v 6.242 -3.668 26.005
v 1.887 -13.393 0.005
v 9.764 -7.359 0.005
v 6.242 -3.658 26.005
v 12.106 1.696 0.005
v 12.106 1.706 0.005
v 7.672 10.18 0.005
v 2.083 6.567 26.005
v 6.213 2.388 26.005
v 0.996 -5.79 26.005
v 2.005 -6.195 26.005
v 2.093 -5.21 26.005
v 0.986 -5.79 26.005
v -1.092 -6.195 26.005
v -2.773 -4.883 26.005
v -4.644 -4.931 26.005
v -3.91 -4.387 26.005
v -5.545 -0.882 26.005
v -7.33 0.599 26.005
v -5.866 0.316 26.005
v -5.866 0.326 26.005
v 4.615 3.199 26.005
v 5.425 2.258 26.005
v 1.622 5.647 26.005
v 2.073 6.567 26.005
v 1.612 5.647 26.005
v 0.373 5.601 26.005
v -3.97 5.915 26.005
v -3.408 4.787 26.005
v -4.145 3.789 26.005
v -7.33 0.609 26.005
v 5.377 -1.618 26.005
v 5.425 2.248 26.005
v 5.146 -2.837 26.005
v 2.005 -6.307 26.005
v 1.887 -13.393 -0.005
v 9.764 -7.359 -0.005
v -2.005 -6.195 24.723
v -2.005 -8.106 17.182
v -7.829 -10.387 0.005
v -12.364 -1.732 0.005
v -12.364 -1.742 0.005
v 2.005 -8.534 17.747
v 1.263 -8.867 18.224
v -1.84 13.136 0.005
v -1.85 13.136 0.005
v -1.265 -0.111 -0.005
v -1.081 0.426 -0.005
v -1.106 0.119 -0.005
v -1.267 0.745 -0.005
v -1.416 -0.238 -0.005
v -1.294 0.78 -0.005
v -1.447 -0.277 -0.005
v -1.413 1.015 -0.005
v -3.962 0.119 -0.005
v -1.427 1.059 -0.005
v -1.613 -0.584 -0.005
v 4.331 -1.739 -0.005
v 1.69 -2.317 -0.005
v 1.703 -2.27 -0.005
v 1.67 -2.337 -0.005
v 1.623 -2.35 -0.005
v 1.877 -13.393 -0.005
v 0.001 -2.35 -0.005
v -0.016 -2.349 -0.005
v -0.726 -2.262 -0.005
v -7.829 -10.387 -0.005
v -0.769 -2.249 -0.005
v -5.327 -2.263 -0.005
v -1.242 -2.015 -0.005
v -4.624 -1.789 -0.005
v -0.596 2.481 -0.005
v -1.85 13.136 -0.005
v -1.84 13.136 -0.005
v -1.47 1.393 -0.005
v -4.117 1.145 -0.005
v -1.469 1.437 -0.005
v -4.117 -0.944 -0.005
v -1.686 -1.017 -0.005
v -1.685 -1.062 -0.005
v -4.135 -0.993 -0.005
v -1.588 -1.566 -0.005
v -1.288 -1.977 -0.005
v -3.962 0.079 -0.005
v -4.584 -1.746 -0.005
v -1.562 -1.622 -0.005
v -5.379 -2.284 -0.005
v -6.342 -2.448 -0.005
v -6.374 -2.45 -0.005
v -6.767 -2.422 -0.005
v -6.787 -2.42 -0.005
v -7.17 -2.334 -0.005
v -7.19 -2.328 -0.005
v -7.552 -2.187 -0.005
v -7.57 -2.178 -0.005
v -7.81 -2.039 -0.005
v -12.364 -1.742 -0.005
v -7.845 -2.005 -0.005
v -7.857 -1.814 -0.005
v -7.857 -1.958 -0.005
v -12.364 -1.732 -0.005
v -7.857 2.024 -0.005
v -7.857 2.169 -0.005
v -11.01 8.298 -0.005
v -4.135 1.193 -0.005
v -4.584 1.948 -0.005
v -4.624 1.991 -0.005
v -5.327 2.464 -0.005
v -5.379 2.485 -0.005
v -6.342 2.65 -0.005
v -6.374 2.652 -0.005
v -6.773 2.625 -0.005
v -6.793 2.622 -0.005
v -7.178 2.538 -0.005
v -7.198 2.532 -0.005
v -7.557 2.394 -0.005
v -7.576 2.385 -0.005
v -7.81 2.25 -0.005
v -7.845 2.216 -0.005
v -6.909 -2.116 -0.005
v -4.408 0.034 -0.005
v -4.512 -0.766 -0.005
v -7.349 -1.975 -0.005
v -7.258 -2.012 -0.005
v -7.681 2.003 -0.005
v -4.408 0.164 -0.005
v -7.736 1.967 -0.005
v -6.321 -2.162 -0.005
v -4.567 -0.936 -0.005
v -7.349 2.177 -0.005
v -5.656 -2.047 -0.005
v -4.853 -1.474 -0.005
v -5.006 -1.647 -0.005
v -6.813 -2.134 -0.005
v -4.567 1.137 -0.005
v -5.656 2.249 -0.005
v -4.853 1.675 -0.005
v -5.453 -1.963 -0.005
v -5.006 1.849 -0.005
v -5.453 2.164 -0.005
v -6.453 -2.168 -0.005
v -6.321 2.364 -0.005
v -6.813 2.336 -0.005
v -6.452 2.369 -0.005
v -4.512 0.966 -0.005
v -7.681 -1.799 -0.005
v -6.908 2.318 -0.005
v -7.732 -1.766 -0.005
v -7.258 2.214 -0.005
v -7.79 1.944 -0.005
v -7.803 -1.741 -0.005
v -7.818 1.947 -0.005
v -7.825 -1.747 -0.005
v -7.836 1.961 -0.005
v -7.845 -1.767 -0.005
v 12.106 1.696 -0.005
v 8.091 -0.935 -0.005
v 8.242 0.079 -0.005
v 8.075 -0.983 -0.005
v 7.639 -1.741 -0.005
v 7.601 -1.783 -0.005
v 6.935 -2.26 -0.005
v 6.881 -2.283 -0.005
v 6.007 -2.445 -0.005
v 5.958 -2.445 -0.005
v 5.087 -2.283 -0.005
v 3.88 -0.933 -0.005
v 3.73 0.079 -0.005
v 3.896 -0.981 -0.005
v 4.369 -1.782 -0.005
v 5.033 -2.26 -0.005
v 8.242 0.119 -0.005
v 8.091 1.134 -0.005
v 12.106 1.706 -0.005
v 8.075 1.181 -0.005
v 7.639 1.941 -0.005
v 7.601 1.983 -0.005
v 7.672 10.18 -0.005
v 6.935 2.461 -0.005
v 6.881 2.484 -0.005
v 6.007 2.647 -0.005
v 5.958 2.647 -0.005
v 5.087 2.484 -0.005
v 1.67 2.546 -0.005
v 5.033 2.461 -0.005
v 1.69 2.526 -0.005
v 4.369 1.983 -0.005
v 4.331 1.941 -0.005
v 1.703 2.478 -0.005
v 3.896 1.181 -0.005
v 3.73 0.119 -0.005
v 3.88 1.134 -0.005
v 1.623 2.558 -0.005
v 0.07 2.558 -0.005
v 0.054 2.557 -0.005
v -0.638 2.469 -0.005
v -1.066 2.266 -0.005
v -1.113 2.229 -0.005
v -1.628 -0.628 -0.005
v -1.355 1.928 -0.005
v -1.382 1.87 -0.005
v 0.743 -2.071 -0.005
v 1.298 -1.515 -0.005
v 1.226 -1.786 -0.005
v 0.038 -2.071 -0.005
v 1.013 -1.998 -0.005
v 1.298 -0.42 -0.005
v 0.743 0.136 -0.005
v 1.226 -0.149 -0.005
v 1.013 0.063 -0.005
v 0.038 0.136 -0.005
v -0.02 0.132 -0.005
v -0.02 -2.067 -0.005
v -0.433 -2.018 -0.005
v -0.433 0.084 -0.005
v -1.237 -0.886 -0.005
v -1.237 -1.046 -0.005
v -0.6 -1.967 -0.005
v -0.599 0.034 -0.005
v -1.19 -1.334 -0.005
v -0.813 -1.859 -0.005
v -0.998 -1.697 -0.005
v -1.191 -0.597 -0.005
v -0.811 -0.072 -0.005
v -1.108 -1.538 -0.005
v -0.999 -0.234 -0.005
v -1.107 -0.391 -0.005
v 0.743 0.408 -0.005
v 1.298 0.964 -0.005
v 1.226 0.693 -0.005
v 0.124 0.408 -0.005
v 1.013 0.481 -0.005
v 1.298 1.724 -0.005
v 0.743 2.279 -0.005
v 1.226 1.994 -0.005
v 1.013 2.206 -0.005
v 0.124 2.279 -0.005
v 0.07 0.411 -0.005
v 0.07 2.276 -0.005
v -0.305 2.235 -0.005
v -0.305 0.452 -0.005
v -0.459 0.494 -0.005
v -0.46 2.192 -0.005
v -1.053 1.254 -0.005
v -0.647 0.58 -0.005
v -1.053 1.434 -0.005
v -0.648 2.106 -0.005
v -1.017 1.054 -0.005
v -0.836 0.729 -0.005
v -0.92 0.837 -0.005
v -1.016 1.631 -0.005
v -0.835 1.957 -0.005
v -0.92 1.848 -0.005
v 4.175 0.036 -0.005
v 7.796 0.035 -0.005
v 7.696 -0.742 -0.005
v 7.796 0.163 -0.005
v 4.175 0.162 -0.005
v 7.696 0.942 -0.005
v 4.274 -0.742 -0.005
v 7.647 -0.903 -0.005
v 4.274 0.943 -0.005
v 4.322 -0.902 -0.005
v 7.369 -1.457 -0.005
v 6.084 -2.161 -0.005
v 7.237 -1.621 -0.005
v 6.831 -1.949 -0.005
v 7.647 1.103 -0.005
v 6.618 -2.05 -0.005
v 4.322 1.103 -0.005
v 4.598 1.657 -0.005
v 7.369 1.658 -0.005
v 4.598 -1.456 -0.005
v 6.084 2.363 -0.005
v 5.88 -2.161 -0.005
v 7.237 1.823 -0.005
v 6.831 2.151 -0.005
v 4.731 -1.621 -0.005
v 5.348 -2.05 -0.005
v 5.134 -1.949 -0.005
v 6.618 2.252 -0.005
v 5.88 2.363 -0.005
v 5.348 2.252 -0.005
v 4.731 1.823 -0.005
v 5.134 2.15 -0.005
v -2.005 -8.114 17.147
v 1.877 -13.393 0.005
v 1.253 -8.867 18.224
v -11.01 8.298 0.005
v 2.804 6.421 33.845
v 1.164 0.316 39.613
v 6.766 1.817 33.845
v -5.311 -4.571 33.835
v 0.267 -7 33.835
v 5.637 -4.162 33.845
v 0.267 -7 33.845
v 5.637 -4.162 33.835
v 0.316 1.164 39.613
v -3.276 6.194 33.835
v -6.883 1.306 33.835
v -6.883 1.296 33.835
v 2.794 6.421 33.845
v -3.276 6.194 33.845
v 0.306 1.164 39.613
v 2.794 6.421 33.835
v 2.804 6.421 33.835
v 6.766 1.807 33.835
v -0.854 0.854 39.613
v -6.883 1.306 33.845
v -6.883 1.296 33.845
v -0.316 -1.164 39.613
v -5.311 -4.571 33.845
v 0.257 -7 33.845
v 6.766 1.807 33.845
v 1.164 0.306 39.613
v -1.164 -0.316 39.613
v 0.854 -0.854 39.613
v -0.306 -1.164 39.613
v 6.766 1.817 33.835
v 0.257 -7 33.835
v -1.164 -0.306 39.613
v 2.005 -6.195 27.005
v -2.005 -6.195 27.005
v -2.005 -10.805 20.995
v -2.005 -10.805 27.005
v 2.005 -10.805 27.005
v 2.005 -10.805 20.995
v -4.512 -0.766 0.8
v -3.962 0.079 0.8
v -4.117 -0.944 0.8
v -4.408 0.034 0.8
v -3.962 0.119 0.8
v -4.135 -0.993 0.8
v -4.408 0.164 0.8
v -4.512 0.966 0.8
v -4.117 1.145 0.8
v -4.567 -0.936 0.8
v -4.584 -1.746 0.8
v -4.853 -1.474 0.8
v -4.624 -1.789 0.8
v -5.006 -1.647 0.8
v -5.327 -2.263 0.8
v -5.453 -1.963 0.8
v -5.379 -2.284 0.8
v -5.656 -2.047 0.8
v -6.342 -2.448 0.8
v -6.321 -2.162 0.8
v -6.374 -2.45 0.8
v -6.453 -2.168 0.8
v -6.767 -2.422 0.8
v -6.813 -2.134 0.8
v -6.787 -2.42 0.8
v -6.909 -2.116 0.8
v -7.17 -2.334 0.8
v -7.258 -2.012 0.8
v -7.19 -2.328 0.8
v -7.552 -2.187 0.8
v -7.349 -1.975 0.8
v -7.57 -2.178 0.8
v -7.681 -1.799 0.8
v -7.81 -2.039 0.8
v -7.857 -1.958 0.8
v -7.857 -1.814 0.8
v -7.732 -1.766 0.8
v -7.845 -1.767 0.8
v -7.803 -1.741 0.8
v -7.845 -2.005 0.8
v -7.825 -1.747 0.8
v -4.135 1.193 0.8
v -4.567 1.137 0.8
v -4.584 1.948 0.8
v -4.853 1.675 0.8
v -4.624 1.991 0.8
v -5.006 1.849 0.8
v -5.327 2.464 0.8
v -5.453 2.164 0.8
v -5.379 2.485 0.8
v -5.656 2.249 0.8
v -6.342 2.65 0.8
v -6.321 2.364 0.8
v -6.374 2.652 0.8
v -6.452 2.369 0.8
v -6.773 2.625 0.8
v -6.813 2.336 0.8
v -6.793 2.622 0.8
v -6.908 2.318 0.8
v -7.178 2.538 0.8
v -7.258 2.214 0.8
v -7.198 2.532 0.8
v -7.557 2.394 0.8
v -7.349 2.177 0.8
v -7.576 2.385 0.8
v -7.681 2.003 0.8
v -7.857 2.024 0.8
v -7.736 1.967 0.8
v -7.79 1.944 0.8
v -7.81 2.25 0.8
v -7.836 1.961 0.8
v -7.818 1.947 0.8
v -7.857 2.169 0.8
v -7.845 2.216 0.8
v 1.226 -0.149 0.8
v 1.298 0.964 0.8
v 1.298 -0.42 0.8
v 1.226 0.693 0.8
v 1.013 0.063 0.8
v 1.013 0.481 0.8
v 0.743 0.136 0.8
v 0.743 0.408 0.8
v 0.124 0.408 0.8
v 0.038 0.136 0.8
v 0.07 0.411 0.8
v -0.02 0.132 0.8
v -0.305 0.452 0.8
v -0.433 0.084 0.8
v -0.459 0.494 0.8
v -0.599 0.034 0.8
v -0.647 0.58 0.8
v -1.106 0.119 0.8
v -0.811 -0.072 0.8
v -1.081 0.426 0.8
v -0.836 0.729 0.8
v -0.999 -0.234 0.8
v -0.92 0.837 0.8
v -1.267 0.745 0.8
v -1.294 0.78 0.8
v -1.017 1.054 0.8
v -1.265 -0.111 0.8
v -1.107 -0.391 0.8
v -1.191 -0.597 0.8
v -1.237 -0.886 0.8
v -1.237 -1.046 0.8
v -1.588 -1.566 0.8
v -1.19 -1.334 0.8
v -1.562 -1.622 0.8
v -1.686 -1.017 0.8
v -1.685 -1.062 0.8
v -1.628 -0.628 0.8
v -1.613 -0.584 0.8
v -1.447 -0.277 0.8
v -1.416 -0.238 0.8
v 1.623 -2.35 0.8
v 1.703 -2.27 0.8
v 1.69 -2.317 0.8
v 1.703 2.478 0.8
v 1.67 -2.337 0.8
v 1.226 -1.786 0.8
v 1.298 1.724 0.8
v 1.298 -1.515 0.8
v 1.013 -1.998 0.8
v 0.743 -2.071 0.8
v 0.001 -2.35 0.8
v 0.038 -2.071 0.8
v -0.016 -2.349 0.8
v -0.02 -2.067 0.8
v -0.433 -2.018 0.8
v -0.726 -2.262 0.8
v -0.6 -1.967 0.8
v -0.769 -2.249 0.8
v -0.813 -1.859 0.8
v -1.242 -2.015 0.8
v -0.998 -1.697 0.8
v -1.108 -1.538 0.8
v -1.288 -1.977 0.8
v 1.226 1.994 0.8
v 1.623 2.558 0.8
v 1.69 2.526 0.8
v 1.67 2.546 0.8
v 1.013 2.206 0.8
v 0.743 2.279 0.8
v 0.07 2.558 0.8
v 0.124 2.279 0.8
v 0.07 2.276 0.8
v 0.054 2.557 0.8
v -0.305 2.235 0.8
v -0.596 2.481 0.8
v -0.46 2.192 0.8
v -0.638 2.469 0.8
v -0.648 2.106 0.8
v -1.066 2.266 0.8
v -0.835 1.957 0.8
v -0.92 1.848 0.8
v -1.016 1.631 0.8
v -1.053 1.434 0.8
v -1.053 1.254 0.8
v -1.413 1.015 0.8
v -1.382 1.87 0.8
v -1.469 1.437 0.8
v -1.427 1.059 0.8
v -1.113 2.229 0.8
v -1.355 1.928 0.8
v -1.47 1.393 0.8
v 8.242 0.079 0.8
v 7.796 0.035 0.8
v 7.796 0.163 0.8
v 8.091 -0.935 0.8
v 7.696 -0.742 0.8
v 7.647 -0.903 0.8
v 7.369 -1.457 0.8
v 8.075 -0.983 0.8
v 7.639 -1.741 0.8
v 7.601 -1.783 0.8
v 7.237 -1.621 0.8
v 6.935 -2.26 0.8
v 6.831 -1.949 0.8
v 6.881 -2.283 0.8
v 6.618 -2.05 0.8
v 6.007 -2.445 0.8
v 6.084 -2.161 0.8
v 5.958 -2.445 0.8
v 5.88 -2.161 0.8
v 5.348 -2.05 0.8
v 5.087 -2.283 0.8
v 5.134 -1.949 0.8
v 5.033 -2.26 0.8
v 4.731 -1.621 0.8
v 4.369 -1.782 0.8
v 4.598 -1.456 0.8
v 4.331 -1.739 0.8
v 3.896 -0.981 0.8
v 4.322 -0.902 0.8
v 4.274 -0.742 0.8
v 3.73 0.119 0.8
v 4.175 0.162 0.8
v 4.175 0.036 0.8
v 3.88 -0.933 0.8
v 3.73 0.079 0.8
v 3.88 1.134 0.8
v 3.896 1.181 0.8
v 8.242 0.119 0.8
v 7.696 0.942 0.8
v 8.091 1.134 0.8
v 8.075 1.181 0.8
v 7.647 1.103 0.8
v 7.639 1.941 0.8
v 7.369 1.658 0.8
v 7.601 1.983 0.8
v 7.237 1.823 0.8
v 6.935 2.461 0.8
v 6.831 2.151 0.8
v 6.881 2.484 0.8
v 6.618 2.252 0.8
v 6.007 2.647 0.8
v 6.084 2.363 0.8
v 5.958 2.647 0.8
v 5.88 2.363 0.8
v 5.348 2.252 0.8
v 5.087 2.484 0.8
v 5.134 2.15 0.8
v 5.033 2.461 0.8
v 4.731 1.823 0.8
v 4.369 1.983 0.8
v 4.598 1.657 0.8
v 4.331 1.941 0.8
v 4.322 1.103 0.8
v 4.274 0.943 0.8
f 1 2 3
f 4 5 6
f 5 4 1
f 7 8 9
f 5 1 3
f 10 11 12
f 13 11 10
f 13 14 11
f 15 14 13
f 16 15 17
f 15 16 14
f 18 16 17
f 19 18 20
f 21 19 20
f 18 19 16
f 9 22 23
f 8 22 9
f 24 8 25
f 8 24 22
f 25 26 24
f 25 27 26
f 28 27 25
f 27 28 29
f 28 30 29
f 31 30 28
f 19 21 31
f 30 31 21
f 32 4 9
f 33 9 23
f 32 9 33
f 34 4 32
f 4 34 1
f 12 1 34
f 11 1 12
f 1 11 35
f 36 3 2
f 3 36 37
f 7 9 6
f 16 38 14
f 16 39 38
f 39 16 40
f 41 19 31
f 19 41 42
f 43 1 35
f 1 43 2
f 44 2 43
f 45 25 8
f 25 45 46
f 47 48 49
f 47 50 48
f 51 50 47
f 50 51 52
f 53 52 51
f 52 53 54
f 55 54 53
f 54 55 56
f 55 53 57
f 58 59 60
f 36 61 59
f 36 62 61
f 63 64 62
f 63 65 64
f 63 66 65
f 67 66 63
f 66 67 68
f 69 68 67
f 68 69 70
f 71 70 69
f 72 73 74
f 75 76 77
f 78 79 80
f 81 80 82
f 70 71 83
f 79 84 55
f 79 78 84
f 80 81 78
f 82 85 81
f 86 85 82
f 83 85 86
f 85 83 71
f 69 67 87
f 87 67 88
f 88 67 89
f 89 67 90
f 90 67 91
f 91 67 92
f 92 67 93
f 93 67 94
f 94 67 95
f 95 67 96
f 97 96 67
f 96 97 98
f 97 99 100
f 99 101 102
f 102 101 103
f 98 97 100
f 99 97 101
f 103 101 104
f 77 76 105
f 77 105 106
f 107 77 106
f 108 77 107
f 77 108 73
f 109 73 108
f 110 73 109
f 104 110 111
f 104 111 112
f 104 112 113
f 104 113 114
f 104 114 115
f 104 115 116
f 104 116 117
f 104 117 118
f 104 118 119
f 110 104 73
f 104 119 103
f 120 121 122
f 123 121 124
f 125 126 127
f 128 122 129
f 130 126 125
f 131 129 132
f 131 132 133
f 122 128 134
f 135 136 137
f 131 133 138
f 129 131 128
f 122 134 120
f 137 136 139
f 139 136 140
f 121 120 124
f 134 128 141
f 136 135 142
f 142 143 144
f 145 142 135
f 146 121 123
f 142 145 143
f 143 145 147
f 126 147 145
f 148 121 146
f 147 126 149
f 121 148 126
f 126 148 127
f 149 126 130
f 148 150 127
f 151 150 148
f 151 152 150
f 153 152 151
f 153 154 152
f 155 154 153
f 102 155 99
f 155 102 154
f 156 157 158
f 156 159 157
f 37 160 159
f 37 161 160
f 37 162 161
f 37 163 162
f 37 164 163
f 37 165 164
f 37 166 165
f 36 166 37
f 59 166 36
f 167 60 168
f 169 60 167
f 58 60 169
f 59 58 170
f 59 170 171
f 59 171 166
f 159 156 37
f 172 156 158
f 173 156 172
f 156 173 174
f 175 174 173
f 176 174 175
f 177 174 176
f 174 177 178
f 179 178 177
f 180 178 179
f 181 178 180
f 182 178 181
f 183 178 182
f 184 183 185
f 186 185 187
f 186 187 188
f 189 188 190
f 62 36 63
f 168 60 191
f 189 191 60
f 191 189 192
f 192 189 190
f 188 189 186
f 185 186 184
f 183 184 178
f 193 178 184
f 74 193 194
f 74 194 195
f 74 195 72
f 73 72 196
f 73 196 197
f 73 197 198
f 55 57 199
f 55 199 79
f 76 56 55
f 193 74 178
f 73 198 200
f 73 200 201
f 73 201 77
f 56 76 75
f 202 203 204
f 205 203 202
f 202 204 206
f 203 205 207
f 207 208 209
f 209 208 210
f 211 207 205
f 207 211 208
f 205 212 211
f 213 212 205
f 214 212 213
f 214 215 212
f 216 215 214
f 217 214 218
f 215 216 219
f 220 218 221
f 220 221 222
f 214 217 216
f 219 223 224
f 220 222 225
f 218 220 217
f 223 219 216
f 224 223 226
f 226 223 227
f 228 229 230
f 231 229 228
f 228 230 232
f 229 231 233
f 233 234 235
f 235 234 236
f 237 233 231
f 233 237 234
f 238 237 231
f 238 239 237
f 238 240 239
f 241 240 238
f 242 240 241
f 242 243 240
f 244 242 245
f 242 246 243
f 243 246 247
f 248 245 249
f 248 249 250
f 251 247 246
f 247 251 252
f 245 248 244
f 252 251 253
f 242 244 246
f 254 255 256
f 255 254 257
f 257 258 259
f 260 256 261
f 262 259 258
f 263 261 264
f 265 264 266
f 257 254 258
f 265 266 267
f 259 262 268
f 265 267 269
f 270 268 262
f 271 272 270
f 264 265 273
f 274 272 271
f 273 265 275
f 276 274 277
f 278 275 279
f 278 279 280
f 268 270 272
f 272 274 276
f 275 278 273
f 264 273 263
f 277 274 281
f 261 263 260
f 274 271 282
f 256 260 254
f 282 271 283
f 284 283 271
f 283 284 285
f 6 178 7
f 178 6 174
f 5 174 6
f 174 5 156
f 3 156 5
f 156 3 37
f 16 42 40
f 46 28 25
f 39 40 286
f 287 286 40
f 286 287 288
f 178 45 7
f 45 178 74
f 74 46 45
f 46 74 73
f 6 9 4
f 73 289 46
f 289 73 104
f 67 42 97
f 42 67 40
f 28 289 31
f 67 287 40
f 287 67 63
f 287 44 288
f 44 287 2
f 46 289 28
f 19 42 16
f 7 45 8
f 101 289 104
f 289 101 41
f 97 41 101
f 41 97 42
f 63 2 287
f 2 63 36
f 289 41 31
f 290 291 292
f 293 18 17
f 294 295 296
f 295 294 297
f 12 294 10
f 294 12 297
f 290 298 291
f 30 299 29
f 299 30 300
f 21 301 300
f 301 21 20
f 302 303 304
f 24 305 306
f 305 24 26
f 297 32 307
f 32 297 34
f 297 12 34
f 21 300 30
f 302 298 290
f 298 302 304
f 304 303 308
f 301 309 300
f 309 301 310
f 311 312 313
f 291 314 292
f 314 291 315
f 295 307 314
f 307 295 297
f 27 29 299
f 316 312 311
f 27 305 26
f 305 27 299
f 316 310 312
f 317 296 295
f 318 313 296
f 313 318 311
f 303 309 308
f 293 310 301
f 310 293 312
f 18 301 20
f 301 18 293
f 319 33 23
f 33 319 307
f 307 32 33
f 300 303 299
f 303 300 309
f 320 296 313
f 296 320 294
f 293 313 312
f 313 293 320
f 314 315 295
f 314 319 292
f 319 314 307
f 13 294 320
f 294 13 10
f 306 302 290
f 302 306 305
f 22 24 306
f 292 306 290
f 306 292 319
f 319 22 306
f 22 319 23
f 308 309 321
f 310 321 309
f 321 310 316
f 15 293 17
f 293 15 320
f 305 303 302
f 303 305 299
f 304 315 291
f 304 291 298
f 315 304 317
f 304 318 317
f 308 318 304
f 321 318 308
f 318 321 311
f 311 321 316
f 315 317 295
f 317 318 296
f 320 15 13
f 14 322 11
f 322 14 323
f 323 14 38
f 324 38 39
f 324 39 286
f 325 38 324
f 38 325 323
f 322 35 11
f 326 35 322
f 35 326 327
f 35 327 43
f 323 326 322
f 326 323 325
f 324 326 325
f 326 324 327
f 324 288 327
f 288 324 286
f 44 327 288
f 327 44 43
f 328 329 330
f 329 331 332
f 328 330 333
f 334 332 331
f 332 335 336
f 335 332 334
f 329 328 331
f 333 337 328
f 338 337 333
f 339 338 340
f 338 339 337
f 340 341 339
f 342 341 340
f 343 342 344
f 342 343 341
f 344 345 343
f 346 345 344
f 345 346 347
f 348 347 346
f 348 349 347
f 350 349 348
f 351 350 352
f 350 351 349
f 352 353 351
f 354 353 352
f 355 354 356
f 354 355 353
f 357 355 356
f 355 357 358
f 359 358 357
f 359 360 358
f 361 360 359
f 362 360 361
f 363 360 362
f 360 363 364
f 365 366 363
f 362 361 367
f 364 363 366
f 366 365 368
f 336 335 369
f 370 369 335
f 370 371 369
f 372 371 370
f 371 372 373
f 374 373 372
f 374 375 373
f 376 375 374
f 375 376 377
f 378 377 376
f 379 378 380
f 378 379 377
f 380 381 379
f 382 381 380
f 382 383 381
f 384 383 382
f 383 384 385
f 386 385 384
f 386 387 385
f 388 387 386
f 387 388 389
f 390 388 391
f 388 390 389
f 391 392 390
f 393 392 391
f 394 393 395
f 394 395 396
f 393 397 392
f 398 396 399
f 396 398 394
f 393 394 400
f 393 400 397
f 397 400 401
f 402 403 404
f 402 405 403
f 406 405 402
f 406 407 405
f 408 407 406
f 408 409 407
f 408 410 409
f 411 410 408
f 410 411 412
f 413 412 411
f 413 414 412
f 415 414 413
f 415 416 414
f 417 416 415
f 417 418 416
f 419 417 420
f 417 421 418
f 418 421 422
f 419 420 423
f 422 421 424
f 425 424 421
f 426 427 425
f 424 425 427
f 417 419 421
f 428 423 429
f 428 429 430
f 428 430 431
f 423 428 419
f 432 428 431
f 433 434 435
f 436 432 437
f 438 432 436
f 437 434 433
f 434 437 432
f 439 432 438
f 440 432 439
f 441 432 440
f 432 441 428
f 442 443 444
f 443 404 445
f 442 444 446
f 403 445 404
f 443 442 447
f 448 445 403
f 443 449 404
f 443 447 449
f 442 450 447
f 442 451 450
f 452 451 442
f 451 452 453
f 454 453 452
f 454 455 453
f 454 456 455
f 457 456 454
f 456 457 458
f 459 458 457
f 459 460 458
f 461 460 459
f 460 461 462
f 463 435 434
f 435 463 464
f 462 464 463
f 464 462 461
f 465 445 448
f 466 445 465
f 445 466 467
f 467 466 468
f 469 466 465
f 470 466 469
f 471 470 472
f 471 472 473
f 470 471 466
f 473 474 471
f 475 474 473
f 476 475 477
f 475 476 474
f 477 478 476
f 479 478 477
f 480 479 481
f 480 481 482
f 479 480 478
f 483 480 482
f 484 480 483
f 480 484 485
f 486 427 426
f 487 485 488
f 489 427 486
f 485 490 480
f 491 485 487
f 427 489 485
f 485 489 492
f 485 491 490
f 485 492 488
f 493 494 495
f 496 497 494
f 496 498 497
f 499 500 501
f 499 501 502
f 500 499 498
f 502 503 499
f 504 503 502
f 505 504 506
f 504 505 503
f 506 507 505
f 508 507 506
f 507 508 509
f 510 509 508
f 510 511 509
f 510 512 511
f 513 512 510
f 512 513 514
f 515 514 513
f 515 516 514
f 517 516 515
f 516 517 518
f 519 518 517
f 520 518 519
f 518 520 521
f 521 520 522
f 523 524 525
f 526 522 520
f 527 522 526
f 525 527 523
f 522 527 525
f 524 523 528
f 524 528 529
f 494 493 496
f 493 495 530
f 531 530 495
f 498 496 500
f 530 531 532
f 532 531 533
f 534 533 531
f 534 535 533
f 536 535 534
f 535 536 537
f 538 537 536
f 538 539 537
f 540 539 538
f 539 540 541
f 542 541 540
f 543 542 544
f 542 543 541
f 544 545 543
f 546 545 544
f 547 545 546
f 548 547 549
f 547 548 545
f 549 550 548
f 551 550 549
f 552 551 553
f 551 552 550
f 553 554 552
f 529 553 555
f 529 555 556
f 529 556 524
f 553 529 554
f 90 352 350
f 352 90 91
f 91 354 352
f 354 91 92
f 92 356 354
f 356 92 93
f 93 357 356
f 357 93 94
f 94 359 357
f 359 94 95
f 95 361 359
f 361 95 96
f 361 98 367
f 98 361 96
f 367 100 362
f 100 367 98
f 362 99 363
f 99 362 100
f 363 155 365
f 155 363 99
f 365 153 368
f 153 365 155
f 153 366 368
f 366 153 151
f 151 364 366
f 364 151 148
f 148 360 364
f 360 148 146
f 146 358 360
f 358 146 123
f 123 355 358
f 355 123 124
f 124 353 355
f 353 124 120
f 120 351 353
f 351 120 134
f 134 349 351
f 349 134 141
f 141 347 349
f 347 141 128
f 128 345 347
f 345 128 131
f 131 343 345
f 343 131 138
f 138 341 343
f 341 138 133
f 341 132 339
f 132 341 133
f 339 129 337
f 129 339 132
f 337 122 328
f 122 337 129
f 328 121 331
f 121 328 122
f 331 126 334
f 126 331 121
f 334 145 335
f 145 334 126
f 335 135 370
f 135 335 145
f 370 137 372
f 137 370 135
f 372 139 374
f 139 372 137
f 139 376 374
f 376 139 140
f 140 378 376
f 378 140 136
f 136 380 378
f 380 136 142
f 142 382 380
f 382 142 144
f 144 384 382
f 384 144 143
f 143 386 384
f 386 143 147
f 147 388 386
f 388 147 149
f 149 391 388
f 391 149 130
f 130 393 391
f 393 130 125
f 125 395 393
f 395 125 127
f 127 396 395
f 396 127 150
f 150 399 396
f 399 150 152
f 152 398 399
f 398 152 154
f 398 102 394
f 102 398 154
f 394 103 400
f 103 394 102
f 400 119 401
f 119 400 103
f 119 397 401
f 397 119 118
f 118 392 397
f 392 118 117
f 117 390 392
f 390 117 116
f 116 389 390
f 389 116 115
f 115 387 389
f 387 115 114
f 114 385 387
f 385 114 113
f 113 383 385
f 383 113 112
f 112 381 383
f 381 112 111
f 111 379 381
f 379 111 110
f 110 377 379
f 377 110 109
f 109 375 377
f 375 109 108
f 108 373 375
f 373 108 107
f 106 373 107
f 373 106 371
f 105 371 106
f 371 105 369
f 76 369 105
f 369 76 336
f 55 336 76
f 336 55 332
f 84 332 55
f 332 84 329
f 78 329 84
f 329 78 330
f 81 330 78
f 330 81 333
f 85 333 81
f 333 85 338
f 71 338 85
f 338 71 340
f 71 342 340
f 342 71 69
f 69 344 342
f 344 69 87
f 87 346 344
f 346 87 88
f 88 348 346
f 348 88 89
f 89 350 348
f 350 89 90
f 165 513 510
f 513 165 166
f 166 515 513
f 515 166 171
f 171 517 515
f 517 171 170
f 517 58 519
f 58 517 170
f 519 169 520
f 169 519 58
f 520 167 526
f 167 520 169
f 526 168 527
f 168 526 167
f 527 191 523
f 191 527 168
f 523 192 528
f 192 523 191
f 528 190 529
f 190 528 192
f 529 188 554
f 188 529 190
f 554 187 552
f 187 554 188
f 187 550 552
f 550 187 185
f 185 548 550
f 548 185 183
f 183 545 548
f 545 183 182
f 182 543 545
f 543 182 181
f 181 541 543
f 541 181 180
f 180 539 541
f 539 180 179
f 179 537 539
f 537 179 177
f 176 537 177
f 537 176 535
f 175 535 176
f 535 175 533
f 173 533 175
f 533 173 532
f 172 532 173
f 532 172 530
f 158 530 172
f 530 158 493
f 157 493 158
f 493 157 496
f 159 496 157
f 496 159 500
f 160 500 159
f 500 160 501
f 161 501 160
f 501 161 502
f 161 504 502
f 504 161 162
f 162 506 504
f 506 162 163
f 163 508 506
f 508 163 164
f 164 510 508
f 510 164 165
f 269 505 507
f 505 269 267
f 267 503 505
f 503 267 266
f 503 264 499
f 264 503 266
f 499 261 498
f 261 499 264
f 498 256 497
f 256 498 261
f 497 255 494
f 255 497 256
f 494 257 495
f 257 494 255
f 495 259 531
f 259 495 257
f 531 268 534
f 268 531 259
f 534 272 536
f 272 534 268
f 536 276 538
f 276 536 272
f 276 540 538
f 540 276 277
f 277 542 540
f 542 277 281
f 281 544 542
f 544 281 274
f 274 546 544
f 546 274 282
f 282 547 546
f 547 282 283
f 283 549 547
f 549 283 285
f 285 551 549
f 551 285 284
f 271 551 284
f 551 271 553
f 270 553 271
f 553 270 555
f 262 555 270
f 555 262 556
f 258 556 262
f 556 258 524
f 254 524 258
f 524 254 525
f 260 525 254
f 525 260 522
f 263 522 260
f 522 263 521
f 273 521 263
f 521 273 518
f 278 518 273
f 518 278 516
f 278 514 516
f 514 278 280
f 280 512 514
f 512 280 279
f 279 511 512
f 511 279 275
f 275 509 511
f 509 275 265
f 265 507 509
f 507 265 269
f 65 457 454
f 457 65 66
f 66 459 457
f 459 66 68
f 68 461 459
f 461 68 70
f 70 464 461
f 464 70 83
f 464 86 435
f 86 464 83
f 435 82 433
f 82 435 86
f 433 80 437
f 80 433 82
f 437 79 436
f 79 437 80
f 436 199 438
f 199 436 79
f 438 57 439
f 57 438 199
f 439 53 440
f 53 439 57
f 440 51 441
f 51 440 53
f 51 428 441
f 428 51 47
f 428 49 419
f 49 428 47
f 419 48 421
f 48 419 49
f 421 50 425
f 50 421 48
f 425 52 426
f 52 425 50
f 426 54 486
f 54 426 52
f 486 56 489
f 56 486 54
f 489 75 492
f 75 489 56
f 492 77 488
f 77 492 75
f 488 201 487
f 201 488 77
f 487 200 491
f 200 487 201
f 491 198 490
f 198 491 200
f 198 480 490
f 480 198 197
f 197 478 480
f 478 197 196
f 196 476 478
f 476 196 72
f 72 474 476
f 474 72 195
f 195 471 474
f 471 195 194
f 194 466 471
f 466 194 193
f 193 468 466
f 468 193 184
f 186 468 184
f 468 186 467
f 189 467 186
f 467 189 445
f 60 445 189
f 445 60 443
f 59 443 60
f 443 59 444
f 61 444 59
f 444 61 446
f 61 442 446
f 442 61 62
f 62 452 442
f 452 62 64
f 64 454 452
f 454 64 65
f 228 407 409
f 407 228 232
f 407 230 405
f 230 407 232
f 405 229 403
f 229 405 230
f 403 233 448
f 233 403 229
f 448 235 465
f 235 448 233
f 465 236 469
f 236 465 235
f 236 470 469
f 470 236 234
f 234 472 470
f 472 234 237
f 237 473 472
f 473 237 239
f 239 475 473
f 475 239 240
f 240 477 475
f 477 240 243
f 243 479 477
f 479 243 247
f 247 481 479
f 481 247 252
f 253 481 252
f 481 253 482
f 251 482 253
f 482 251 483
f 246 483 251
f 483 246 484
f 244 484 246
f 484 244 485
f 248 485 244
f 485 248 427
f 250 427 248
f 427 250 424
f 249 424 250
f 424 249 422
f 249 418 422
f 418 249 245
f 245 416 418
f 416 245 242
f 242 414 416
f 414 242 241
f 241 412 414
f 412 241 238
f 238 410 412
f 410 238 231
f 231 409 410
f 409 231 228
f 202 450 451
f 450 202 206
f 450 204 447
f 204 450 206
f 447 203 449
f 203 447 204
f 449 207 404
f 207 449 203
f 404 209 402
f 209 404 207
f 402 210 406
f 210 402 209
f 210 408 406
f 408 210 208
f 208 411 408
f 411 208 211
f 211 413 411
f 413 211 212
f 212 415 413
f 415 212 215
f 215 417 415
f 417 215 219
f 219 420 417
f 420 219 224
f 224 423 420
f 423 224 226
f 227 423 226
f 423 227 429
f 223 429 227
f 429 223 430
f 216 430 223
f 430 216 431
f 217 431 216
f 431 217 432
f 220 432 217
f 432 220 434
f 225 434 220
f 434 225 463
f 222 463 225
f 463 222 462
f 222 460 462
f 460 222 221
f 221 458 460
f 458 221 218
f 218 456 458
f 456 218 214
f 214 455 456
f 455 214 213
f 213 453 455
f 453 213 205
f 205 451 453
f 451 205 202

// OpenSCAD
// file: ../brand/obc_mark.scad
// The OBC maker's mark (2026-10-14), from the logo Scott chose: OBC in a heavy
// geometric face, struck through with horizontal stripes. One drawing for
// every model, so every print carries the same mark.
//
// It goes on the underside as an INLAY: the letters cut 0.6 mm in and filled
// in a contrasting colour, flush with the base. On a white base that reads as
// crisp dark letters straight off the bed; engraved white on white, the old
// mark barely showed. The logo's stripes become grooves one layer deep across
// the letters' face: each catches a shadow, like the ridges on the gold logo,
// and the letters stay whole in colour above them, so they read at any size.
//
// Struck right through the letters, as in the logo, the stripes failed both
// ways (2026-10-14): in plastic a stripe cannot be finer than two beads, so at
// 4-6 mm one stripe took out the B's middle bar and it stopped reading as a B,
// and at 8-10 mm the stripes were as wide as the letter between them and OBC
// broke up like a barcode.
//
//   obc_inlay(h)     the coloured part, h = cap height in mm: give it to the
//                    contrasting colour
//   obc_cut(h)       what to subtract from the base: the whole letters, so
//                    the grooves are open, not left in the base's colour
//   obc_engrave(h)   the same as a cutter, for a one-colour model
//   obc_mark_width(h)
// Both are mirrored to read from below, sit on z = 0 and are centred on the
// origin; translate them to the spot on the base.
//
// The letters are Montserrat ExtraBold, the logo's face, set 0.95 apart (the
// logo's are almost touching; in plastic every gap needs two beads, 0.9). The
// drawing is cleaned the way a nozzle draws, so what it shows is what prints.

OBC_FONT = "Montserrat:style=ExtraBold";
OBC_GAP = 0.95;             // between letters, and each groove's width
OBC_BAND = 1.1;             // letter face left between two grooves
OBC_INLAY = 0.6;            // the inlay's depth: three layers at 0.2
OBC_GROOVE = 0.2;           // the grooves' depth: the first layer

// glyph boxes at size 10, measured: [letter, ink start, ink width] (2026-10-14)
OBC_GLYPHS = [["O", 0.48, 10.79], ["B", 0.98, 9.24], ["C", 0.48, 9.52]];
function obc_u(h) = h / 9.72;                       // text size per mm of cap height
function obc_mark_width(h) = 29.55 * obc_u(h) + 2 * OBC_GAP;
function obc_grooves(h) = max(0, floor((h + OBC_GAP) / (OBC_BAND + OBC_GAP)) - 1);

module obc_letters(h) let (u = obc_u(h), x0 = -obc_mark_width(h) / 2) {
    for (i = [0 : 2]) let (g = OBC_GLYPHS[i],
            start = x0 + (i == 0 ? 0 : i == 1 ? 10.79 * u + OBC_GAP : (10.79 + 9.24) * u + 2 * OBC_GAP))
        translate([start - g[1] * u, -h / 2]) text(g[0], size = 10 * u, font = OBC_FONT, halign = "left", valign = "baseline");
}
module obc_grooves2d(h) let (n = obc_grooves(h), b = (h - n * OBC_GAP) / (n + 1))
    for (k = [1 : n]) translate([-50, -h / 2 + k * b + (k - 1) * OBC_GAP]) square([100, OBC_GAP]);

// cleaned as a nozzle draws: gaps under 0.85 closed, strokes under a bead opened
module obc_clean() offset(r = 0.21, $fn = 12) offset(delta = -0.21) offset(r = -0.425, $fn = 12) offset(delta = 0.425) children();

module obc_solid2d(h) obc_clean() obc_letters(h);                                   // the letters
module obc_face2d(h) obc_clean() difference() { obc_solid2d(h); obc_grooves2d(h); } // their face: the bands between grooves

// the coloured part: the face in the first layer, the whole letters above it.
// It stands 0.02 proud of its cut: exactly on it, the inlay's outline and the
// cut's met at near-coincident faces and the welded print had open edges
// round the letters (2026-10-14). Split into colours, the inlay takes the
// overlap, so the colour boundary does not move.
module obc_inlay(h, depth = OBC_INLAY) mirror([1, 0, 0]) {
    linear_extrude(OBC_GROOVE + 0.01) offset(delta = 0.02) obc_face2d(h);
    translate([0, 0, OBC_GROOVE]) linear_extrude(depth - OBC_GROOVE) offset(delta = 0.02) obc_solid2d(h);
}
module obc_cut(h, depth = OBC_INLAY) mirror([1, 0, 0]) translate([0, 0, -0.5]) linear_extrude(depth + 0.5) obc_solid2d(h);
// as a cutter: the face's bands in the first layer, the whole letters above,
// so the grooves stay at the face as ridges. Built from the same two shapes as
// the inlay: subtracting one cleaned outline from the other left slivers of
// no width and a mesh CGAL would not close (2026-10-21, its first use).
// inset > 0 pulls the cut in that far all round: the walls left between the
// letters and the ridges across them grow by twice it. A one-colour mark has no
// inlay to fill them, and at the logo's 0.95 they read as walls under the
// gate's 1.2 floor (the nativity, 2026-10-21).
// ridges = false cuts the letters whole: with no inlay above them, the ridges
// are strips one layer thick and the gate reads them as 0.2 mm walls.
module obc_engrave(h, depth = 0.8, inset = 0, ridges = true) mirror([1, 0, 0]) {
    if (ridges) {
        translate([0, 0, -0.5]) linear_extrude(0.5 + OBC_GROOVE + 0.01) offset(delta = -inset) obc_face2d(h);
        translate([0, 0, OBC_GROOVE]) linear_extrude(depth - OBC_GROOVE) offset(delta = -inset) obc_solid2d(h);
    } else translate([0, 0, -0.5]) linear_extrude(depth + 0.5) offset(delta = -inset) obc_solid2d(h);
}
// main file
// Faceted nativity set (2026-10-21). Scott picked the low-poly form (5A) from
// five: every figure cut from flat faces, like a carved gem or folded paper.
//
// Eleven prints: Mary, Joseph, the baby in the manger, three kings, a
// shepherd, an ox, a donkey, a sheep and the stable. Each figure stands about
// 60 mm; the stable is 170 mm across, open at the front under a pointed arch.
//
// Printed upright, each as it sits in the file, with no support. The faceting
// is what makes that possible:
//   robes narrow as they rise, so their faces lean in;
//   heads are double pyramids whose lower faces climb at 55 deg, where a round
//   head would overhang under the chin;
//   hands, gifts and the baby rest on wedges that climb 55 deg or sink into hay;
//   the animals lie down, so there are no legs to snap;
//   the stable is an open shell whose roof climbs 46 deg.
//   Staffs stand inside the robe up to the hand, so they are not free poles.
// The maker's mark is engraved in each piece's underside.
//
// piece = mary | joseph | baby | king1 | king2 | king3 | shepherd | ox |
//         donkey | sheep | stable
// part  = body | gold (crowns, gifts, the star) | union | all
include <../brand/obc_mark.scad>

piece = "mary";
part = "all";

$fn = 24;

// ---- faceted solids ------------------------------------------------------------------------------
// the hull of a set of points: every face flat
module pts(P) hull() for (p = P) translate(p) cube(0.01, center = true);
function ring(n, r, z, a0 = 0, jit = 0) = [for (i = [0 : n - 1]) let (a = a0 + 360 * i / n, rr = r * (1 + jit * ((i * 37 % 7) / 6 - 0.5)))
    [rr * cos(a), rr * sin(a), z]];

// a robe: a faceted frustum, rb at the foot, rs at the shoulders zs; it narrows, so its faces lean in
module robe(rb, rs, zs, n = 7, a0 = 0) pts(concat(ring(n, rb, 0, a0, 0.12), ring(n - 1, rs, zs, a0 + 13, 0.1)));
// a head: a six-sided double pyramid, its lower edges 51 deg from flat and its
// faces 55. (At 46 and 50 they sat on the slicer's 45 deg line and it propped
// one king's chin from his shoulders.) Its top is a small flat, not a point: a
// point is sliced away (printed heights came up short, 2026-10-21).
module head_at(c, r, a0 = 0) translate([c[0], c[1], 0]) pts(concat(ring(6, 0.6, c[2] + r, a0), ring(6, r, c[2] + 0.15 * r, a0), [[0, 0, c[2] - 1.1 * r]]));
// a hood or headscarf: the head grown 25% and drawn down into the shoulders,
// its foot inside the robe's top (0.6 outside it, it overhung all round and the
// slicer propped Mary's shoulders, 2026-10-21)
module hood(c, r, rs, zs, a0 = 0) translate([c[0], c[1], 0])
    pts(concat(ring(6, 1.2, c[2] + 1.18 * r, a0), ring(7, 1.25 * r, c[2] + 0.15 * r, a0), ring(7, 0.8 * rs, zs - 2, a0 + 10)));
// a block held out in front of the chest at height z, d out from the axis,
// carried on a wedge that climbs 55 deg back into the robe (45 sits on the
// slicer's own threshold)
module held(z, d, w, h, out) pts([[-w / 2, -d + 1, z - 1.43 * (out + 1)], [w / 2, -d + 1, z - 1.43 * (out + 1)],
    [-w / 2, -d - out, z], [w / 2, -d - out, z], [-w / 2, -d - out, z + h], [w / 2, -d - out, z + h],
    [-w / 2, -d + 1, z + h], [w / 2, -d + 1, z + h]]);
// a staff standing at (x, y), r thick, up to z
module staff(x, y, z, r = 2.0) translate([x, y, 0]) cylinder(r = r, h = z, $fn = 6);

// a cape from the shoulders to zh: it stands 1.5 out of the robe at its hem,
// whose underside climbs 55 deg back into the robe, 4 mm up. (As a flat ring
// 2 mm out it put 10,000 support moves under each king; climbing 48 deg, close
// to the slicer's 45, it still put 7,000, 2026-10-21.)
function rob(z, rb, rs, zs) = rb - (rb - rs) * z / zs;
module cape(zs, rb, rs, zh = 0) let (z1 = zh > 0 ? zh : zs * 0.45, r1 = rob(z1, rb, rs, zs))
    pts(concat(ring(7, rs * 0.9, zs + 0.5, 20), ring(7, r1 + 1.5, z1, 5), ring(7, r1 - 1.3, z1 - 4, 5)));

// ---- the figures ---------------------------------------------------------------------------------
// Mary, kneeling, hooded, hands together
module mary() {
    robe(13, 7, 26, 8, 8);
    hood([0, 0, 33], 5.6, 7, 26, 15);
    head_at([0, -0.8, 33], 5.0, 15);
    held(21, 7.2, 4.0, 6.0, 3.6);            // praying hands
}
// Joseph, standing with his staff
module joseph() {
    robe(12, 7.5, 42, 7, 5);
    head_at([0, 0, 49], 5.6, 0);
    // beard and neck, its foot inside the robe's top (1 mm above it, the slicer propped it)
    pts(concat(ring(6, 4.0, 41, 20), ring(6, 3.2, 50.5, 0), [[0, -2.6, 46], [0, -3.2, 41]]));
    staff(9.5, -1.0, 62, 2.0);
    held(34, 7.6, 7.0, 4.4, 2.0);            // the hand on the staff
}
// the baby, swaddled, on hay in the manger
module baby() {
    // the manger: a trough whose sides lean out 15 deg, filled level with hay
    pts([[-17, -7, 0], [17, -7, 0], [-17, 7, 0], [17, 7, 0], [-19.5, -9.5, 10], [19.5, -9.5, 10], [-19.5, 9.5, 10], [19.5, 9.5, 10]]);
    // block feet: square at the toe, then a 55 deg chamfer up into the trough.
    // As wedges they had knife edges at the toe and on top, which the gate
    // read as walls 0.01 to 0.14 thick (2026-10-21).
    for (s = [-1, 1]) pts([[s * 16, -9.6, 0], [s * 20.5, -9.6, 0], [s * 16, 9.6, 0], [s * 20.5, 9.6, 0],
                           [s * 16, -9.6, 1.5], [s * 20.5, -9.6, 1.5], [s * 16, 9.6, 1.5], [s * 20.5, 9.6, 1.5],
                           [s * 16, -9.6, 4.4], [s * 18.5, -9.6, 4.4], [s * 16, 9.6, 4.4], [s * 18.5, 9.6, 4.4]]);
    // the hay, a faceted mound over the rim
    pts(concat(ring(8, 17, 10, 0, 0.0) * 1, [[0, 0, 13]]) * [[1, 0, 0], [0, 0.5, 0], [0, 0, 1]]);
    // the baby: a swaddled bundle, its foot down in the hay (at 11.5 its corners
    // stood over the mound's falling edge and were propped), and its head
    pts([[-11, -4, 10.4], [9, -4, 10.4], [-11, 4, 10.4], [9, 4, 10.4], [-9, -3, 16.5], [7, -3, 16.5], [-9, 3, 16.5], [7, 3, 16.5]]);
    translate([11.5, 0, 0]) pts(concat(ring(6, 0.8, 19.4, 0), ring(6, 4.0, 15.0, 0), [[0, 0, 10.8]]));   // sunk into the hay
}
// a king: tall robe, crown, a gift held in front; style 1..3
module king(style) let (zs = [0, 44, 41, 43][style], hz = zs + 4.4, hr = 5.4) {
    robe(12.5, 7.4, zs, [0, 7, 8, 6][style], style * 17);
    head_at([0, 0, hz], hr, style * 10);
    cape(zs, 12.5, 7.4);
}
module king_gold(style) let (zs = [0, 44, 41, 43][style], hz = zs + 4.4, hr = 5.4, zc = hz + 0.15 * hr + 1.4,
        rc = 0.8 * hr * (1 - 1.4 / (0.85 * hr)), np = [0, 6, 5, 6][style], ph = [0, 3.4, 4.6, 2.6][style]) {
    // the crown: a band starting inside the head's top faces, flaring out 55 deg
    // and then straight up 1.2, so its rim is square (flaring to the top it was a
    // 60 deg knife edge; a lip 0.6 tall read as a 0.6 wall). Its points end in
    // flats 1.4 square (points are sliced away; 0.5 x 1.0 they were walls under
    // the gate's floor), their feet's corners inside the band's six flat sides:
    // 0.2 past them, the slicer propped them from the shoulders (2026-10-21).
    translate([0, 0, zc]) {
        rotate([0, 0, style * 10]) { cylinder(r1 = rc, r2 = rc + 1.0, h = 1.4, $fn = 6); translate([0, 0, 1.4]) cylinder(r = rc + 1.0, h = 1.2, $fn = 6); }
        for (i = [0 : np - 1]) rotate([0, 0, 360 * i / np + 30])
            pts([[rc - 1.0, -1.1, 2.5], [rc - 1.0, 1.1, 2.5], [rc + 0.2, -1.1, 2.5], [rc + 0.2, 1.1, 2.5],
                 [rc - 0.4, -0.75, 2.5 + ph], [rc - 0.4, 0.75, 2.5 + ph], [rc + 1.0, -0.75, 2.5 + ph], [rc + 1.0, 0.75, 2.5 + ph]]);
    }
    // the gift: a casket, a jar, a horn
    if (style == 1) held(28, 8.2, 8, 6, 3.2);
    // the jar rests on a cone that climbs 55 deg out of the cape (on a wedge to
    // one point, its front hung at 28 deg and was propped)
    if (style == 2) pts(concat(ring(6, 3.2, 27, 0) + [for (i = [0 : 5]) [0, -11, 0]], ring(6, 3.6, 34, 0) + [for (i = [0 : 5]) [0, -11, 0]],
        ring(6, 1.2, 20, 0) + [for (i = [0 : 5]) [0, -8.5, 0]]));
    if (style == 3) pts([[-2.6, -8.4, 25], [2.6, -8.4, 25], [-2.2, -8.2, 22], [2.2, -8.2, 22], [-1.4, -13.6, 34], [1.4, -13.6, 34], [0, -12.6, 36.5]]);
}
// the shepherd: a short robe, a headscarf, his staff
module shepherd() {
    robe(11.5, 7, 38, 7, 40);
    hood([0, 0, 45], 5.0, 6.6, 38, 22);
    head_at([0, -1.0, 45], 4.8, 22);
    staff(-9.5, -0.5, 58, 2.0);
    held(31, 7.2, 6.0, 4.0, 2.4);
}
// the animals lie down: bodies flat on the plate, heads resting forward
module ox() {
    pts([[-20, -9, 0], [16, -9, 0], [-20, 9, 0], [16, 9, 0], [-17, -7, 13], [12, -7, 15], [-17, 7, 13], [12, 7, 15], [-6, 0, 17]]);
    pts([[14, -6, 0], [14, 6, 0], [27, -4.5, 0], [27, 4.5, 0], [15, -5.5, 14], [15, 5.5, 14], [24, -4, 10], [24, 4, 10]]);   // head, chin down
    // horns: a foot inside the head climbing to a flat tip (out to 6.6 the
    // foot stood past the head's side and was propped)
    for (s = [-1, 1]) pts([[15.6, s * 2.6, 10], [18.0, s * 2.6, 10], [15.6, s * 4.8, 10], [18.0, s * 4.8, 10],
                           [16.3, s * 7.8, 18.5], [17.4, s * 7.8, 18.5], [16.3, s * 9.0, 18.5], [17.4, s * 9.0, 18.5]]);
}
module donkey() {
    pts([[-17, -7.5, 0], [14, -7.5, 0], [-17, 7.5, 0], [14, 7.5, 0], [-14, -6, 12], [10, -6, 13], [-14, 6, 12], [10, 6, 13]]);
    pts([[12, -4.6, 0], [12, 4.6, 0], [26, -3.4, 0], [26, 3.4, 0], [13, -4.2, 17], [13, 4.2, 17], [24, -3, 8.5], [24, 3, 8.5]]);   // head
    // long ears, 1.2 x 1.4 at the tip, their feet inside the head (from 12.4
    // they stood 0.4 behind it, a sliver the slicer propped)
    for (s = [-1, 1]) pts([[13.2, s * 1.6, 13], [15.6, s * 1.6, 13], [13.2, s * 3.8, 13], [15.6, s * 3.8, 13],
                           [13.4, s * 3.6, 27], [14.8, s * 3.6, 27], [13.4, s * 4.8, 27], [14.8, s * 4.8, 27]]);
}
module sheep() {
    pts(concat(ring(8, 9, 0, 0, 0.15), ring(7, 8, 7, 10, 0.2), [[0, 0, 11.5]]) * [[1.25, 0, 0], [0, 1, 0], [0, 0, 1]]);
    // the head, its crown flat for 2.5 mm before it slopes to the nose: sloping
    // straight from the back it met the back face in a 60 deg knife edge
    pts([[9, -3.6, 0], [9, 3.6, 0], [18, -2.4, 0], [18, 2.4, 0], [10, -3.2, 10.5], [10, 3.2, 10.5],
         [12.5, -3, 10.5], [12.5, 3, 10.5], [16.5, -2, 6], [16.5, 2, 6]]);
}
// the stable: a shell 3 mm thick, open at the front, its back, sides, roof and
// floor closed. The roof climbs 46 deg to its ridge, so its underside prints
// with no support; the figures stand inside under it. (Solid, with a pointed
// arch cut through, it was 606 cm3, about 750 g, 2026-10-21.)
SW = 150; SD = 70; SE = 55; SR = SE + 78;   // width, depth, eave height, ridge height
ST = 3;                                     // the shell
function gable(w, e, r) = [[-w / 2, 0], [w / 2, 0], [w / 2, e], [0, r], [-w / 2, e]];
module stable() translate([SW / 2, 0, 0]) difference() {
    rotate([90, 0, 0]) translate([0, 0, -SD]) linear_extrude(SD) polygon(gable(SW, SE, SR));
    // the hollow: the profile pulled in ST all round (its roof stays 46 deg), from the front to ST short of the back
    // the inside roof sits ST below the outside one measured square to it,
    // ST * sqrt(1 + k^2) straight down
    let (k = (SR - SE) / (SW / 2), v = ST * sqrt(1 + k * k), xi = SW / 2 - ST)
    translate([0, -1, 0]) rotate([90, 0, 0]) translate([0, 0, -(SD - ST + 1)]) linear_extrude(SD - ST + 1)
        polygon([[-xi, ST], [xi, ST], [xi, SE + k * ST - v], [0, SR - v], [-xi, SE + k * ST - v]]);
    translate([0, SD / 2, 0]) obc_engrave(8, 0.8, 0.15, ridges = false);
}
// the Star of Bethlehem stands on the ridge at the front: four short arms and a
// long tail down to the ridge. Every underside climbs 47 deg or more; a
// five-pointed star's side arms climb only 38 under their points and the
// slicer propped them (2026-10-21).
module bethlehem2d() polygon([[0, 34], [2.4, 24.6], [8.8, 22], [1.8, 14.4], [0, 0], [-1.8, 14.4], [-8.8, 22], [-2.4, 24.6]]);
// as thick as the roof shell and over it: 4 thick it stood 0.5 out past the
// open front, over nothing, and the slicer propped it from the plate
module star_ridge() translate([SW / 2, ST / 2 + 0.2, SR - 3]) rotate([90, 0, 0]) linear_extrude(ST - 0.4, center = true) bethlehem2d();

// ---- parts -----------------------------------------------------------------------------------------
MARK_H = piece == "sheep" ? 4.4 : 5.0;
module mark() obc_engrave(MARK_H, 0.8, 0.15, ridges = false);
module body_of(p) {
    if (p == "mary") mary();
    if (p == "joseph") joseph();
    if (p == "baby") baby();
    if (p == "king1") king(1);
    if (p == "king2") king(2);
    if (p == "king3") king(3);
    if (p == "shepherd") shepherd();
    if (p == "ox") ox();
    if (p == "donkey") donkey();
    if (p == "sheep") sheep();
    if (p == "stable") stable();
}
module gold_of(p) {
    if (p == "king1") king_gold(1);
    if (p == "king2") king_gold(2);
    if (p == "king3") king_gold(3);
    if (p == "stable") star_ridge();
}
module body_part() difference() { body_of(piece); gold_of(piece); if (piece != "stable") mark(); }
module gold_part() difference() { gold_of(piece); if (piece != "stable") mark(); }
if (part == "body") body_part();
if (part == "gold") gold_part();
if (part == "union") union() { body_part(); gold_part(); }
if (part == "all") { color("#7A5C3F") body_part(); color("#C9A84C") gold_part(); }
